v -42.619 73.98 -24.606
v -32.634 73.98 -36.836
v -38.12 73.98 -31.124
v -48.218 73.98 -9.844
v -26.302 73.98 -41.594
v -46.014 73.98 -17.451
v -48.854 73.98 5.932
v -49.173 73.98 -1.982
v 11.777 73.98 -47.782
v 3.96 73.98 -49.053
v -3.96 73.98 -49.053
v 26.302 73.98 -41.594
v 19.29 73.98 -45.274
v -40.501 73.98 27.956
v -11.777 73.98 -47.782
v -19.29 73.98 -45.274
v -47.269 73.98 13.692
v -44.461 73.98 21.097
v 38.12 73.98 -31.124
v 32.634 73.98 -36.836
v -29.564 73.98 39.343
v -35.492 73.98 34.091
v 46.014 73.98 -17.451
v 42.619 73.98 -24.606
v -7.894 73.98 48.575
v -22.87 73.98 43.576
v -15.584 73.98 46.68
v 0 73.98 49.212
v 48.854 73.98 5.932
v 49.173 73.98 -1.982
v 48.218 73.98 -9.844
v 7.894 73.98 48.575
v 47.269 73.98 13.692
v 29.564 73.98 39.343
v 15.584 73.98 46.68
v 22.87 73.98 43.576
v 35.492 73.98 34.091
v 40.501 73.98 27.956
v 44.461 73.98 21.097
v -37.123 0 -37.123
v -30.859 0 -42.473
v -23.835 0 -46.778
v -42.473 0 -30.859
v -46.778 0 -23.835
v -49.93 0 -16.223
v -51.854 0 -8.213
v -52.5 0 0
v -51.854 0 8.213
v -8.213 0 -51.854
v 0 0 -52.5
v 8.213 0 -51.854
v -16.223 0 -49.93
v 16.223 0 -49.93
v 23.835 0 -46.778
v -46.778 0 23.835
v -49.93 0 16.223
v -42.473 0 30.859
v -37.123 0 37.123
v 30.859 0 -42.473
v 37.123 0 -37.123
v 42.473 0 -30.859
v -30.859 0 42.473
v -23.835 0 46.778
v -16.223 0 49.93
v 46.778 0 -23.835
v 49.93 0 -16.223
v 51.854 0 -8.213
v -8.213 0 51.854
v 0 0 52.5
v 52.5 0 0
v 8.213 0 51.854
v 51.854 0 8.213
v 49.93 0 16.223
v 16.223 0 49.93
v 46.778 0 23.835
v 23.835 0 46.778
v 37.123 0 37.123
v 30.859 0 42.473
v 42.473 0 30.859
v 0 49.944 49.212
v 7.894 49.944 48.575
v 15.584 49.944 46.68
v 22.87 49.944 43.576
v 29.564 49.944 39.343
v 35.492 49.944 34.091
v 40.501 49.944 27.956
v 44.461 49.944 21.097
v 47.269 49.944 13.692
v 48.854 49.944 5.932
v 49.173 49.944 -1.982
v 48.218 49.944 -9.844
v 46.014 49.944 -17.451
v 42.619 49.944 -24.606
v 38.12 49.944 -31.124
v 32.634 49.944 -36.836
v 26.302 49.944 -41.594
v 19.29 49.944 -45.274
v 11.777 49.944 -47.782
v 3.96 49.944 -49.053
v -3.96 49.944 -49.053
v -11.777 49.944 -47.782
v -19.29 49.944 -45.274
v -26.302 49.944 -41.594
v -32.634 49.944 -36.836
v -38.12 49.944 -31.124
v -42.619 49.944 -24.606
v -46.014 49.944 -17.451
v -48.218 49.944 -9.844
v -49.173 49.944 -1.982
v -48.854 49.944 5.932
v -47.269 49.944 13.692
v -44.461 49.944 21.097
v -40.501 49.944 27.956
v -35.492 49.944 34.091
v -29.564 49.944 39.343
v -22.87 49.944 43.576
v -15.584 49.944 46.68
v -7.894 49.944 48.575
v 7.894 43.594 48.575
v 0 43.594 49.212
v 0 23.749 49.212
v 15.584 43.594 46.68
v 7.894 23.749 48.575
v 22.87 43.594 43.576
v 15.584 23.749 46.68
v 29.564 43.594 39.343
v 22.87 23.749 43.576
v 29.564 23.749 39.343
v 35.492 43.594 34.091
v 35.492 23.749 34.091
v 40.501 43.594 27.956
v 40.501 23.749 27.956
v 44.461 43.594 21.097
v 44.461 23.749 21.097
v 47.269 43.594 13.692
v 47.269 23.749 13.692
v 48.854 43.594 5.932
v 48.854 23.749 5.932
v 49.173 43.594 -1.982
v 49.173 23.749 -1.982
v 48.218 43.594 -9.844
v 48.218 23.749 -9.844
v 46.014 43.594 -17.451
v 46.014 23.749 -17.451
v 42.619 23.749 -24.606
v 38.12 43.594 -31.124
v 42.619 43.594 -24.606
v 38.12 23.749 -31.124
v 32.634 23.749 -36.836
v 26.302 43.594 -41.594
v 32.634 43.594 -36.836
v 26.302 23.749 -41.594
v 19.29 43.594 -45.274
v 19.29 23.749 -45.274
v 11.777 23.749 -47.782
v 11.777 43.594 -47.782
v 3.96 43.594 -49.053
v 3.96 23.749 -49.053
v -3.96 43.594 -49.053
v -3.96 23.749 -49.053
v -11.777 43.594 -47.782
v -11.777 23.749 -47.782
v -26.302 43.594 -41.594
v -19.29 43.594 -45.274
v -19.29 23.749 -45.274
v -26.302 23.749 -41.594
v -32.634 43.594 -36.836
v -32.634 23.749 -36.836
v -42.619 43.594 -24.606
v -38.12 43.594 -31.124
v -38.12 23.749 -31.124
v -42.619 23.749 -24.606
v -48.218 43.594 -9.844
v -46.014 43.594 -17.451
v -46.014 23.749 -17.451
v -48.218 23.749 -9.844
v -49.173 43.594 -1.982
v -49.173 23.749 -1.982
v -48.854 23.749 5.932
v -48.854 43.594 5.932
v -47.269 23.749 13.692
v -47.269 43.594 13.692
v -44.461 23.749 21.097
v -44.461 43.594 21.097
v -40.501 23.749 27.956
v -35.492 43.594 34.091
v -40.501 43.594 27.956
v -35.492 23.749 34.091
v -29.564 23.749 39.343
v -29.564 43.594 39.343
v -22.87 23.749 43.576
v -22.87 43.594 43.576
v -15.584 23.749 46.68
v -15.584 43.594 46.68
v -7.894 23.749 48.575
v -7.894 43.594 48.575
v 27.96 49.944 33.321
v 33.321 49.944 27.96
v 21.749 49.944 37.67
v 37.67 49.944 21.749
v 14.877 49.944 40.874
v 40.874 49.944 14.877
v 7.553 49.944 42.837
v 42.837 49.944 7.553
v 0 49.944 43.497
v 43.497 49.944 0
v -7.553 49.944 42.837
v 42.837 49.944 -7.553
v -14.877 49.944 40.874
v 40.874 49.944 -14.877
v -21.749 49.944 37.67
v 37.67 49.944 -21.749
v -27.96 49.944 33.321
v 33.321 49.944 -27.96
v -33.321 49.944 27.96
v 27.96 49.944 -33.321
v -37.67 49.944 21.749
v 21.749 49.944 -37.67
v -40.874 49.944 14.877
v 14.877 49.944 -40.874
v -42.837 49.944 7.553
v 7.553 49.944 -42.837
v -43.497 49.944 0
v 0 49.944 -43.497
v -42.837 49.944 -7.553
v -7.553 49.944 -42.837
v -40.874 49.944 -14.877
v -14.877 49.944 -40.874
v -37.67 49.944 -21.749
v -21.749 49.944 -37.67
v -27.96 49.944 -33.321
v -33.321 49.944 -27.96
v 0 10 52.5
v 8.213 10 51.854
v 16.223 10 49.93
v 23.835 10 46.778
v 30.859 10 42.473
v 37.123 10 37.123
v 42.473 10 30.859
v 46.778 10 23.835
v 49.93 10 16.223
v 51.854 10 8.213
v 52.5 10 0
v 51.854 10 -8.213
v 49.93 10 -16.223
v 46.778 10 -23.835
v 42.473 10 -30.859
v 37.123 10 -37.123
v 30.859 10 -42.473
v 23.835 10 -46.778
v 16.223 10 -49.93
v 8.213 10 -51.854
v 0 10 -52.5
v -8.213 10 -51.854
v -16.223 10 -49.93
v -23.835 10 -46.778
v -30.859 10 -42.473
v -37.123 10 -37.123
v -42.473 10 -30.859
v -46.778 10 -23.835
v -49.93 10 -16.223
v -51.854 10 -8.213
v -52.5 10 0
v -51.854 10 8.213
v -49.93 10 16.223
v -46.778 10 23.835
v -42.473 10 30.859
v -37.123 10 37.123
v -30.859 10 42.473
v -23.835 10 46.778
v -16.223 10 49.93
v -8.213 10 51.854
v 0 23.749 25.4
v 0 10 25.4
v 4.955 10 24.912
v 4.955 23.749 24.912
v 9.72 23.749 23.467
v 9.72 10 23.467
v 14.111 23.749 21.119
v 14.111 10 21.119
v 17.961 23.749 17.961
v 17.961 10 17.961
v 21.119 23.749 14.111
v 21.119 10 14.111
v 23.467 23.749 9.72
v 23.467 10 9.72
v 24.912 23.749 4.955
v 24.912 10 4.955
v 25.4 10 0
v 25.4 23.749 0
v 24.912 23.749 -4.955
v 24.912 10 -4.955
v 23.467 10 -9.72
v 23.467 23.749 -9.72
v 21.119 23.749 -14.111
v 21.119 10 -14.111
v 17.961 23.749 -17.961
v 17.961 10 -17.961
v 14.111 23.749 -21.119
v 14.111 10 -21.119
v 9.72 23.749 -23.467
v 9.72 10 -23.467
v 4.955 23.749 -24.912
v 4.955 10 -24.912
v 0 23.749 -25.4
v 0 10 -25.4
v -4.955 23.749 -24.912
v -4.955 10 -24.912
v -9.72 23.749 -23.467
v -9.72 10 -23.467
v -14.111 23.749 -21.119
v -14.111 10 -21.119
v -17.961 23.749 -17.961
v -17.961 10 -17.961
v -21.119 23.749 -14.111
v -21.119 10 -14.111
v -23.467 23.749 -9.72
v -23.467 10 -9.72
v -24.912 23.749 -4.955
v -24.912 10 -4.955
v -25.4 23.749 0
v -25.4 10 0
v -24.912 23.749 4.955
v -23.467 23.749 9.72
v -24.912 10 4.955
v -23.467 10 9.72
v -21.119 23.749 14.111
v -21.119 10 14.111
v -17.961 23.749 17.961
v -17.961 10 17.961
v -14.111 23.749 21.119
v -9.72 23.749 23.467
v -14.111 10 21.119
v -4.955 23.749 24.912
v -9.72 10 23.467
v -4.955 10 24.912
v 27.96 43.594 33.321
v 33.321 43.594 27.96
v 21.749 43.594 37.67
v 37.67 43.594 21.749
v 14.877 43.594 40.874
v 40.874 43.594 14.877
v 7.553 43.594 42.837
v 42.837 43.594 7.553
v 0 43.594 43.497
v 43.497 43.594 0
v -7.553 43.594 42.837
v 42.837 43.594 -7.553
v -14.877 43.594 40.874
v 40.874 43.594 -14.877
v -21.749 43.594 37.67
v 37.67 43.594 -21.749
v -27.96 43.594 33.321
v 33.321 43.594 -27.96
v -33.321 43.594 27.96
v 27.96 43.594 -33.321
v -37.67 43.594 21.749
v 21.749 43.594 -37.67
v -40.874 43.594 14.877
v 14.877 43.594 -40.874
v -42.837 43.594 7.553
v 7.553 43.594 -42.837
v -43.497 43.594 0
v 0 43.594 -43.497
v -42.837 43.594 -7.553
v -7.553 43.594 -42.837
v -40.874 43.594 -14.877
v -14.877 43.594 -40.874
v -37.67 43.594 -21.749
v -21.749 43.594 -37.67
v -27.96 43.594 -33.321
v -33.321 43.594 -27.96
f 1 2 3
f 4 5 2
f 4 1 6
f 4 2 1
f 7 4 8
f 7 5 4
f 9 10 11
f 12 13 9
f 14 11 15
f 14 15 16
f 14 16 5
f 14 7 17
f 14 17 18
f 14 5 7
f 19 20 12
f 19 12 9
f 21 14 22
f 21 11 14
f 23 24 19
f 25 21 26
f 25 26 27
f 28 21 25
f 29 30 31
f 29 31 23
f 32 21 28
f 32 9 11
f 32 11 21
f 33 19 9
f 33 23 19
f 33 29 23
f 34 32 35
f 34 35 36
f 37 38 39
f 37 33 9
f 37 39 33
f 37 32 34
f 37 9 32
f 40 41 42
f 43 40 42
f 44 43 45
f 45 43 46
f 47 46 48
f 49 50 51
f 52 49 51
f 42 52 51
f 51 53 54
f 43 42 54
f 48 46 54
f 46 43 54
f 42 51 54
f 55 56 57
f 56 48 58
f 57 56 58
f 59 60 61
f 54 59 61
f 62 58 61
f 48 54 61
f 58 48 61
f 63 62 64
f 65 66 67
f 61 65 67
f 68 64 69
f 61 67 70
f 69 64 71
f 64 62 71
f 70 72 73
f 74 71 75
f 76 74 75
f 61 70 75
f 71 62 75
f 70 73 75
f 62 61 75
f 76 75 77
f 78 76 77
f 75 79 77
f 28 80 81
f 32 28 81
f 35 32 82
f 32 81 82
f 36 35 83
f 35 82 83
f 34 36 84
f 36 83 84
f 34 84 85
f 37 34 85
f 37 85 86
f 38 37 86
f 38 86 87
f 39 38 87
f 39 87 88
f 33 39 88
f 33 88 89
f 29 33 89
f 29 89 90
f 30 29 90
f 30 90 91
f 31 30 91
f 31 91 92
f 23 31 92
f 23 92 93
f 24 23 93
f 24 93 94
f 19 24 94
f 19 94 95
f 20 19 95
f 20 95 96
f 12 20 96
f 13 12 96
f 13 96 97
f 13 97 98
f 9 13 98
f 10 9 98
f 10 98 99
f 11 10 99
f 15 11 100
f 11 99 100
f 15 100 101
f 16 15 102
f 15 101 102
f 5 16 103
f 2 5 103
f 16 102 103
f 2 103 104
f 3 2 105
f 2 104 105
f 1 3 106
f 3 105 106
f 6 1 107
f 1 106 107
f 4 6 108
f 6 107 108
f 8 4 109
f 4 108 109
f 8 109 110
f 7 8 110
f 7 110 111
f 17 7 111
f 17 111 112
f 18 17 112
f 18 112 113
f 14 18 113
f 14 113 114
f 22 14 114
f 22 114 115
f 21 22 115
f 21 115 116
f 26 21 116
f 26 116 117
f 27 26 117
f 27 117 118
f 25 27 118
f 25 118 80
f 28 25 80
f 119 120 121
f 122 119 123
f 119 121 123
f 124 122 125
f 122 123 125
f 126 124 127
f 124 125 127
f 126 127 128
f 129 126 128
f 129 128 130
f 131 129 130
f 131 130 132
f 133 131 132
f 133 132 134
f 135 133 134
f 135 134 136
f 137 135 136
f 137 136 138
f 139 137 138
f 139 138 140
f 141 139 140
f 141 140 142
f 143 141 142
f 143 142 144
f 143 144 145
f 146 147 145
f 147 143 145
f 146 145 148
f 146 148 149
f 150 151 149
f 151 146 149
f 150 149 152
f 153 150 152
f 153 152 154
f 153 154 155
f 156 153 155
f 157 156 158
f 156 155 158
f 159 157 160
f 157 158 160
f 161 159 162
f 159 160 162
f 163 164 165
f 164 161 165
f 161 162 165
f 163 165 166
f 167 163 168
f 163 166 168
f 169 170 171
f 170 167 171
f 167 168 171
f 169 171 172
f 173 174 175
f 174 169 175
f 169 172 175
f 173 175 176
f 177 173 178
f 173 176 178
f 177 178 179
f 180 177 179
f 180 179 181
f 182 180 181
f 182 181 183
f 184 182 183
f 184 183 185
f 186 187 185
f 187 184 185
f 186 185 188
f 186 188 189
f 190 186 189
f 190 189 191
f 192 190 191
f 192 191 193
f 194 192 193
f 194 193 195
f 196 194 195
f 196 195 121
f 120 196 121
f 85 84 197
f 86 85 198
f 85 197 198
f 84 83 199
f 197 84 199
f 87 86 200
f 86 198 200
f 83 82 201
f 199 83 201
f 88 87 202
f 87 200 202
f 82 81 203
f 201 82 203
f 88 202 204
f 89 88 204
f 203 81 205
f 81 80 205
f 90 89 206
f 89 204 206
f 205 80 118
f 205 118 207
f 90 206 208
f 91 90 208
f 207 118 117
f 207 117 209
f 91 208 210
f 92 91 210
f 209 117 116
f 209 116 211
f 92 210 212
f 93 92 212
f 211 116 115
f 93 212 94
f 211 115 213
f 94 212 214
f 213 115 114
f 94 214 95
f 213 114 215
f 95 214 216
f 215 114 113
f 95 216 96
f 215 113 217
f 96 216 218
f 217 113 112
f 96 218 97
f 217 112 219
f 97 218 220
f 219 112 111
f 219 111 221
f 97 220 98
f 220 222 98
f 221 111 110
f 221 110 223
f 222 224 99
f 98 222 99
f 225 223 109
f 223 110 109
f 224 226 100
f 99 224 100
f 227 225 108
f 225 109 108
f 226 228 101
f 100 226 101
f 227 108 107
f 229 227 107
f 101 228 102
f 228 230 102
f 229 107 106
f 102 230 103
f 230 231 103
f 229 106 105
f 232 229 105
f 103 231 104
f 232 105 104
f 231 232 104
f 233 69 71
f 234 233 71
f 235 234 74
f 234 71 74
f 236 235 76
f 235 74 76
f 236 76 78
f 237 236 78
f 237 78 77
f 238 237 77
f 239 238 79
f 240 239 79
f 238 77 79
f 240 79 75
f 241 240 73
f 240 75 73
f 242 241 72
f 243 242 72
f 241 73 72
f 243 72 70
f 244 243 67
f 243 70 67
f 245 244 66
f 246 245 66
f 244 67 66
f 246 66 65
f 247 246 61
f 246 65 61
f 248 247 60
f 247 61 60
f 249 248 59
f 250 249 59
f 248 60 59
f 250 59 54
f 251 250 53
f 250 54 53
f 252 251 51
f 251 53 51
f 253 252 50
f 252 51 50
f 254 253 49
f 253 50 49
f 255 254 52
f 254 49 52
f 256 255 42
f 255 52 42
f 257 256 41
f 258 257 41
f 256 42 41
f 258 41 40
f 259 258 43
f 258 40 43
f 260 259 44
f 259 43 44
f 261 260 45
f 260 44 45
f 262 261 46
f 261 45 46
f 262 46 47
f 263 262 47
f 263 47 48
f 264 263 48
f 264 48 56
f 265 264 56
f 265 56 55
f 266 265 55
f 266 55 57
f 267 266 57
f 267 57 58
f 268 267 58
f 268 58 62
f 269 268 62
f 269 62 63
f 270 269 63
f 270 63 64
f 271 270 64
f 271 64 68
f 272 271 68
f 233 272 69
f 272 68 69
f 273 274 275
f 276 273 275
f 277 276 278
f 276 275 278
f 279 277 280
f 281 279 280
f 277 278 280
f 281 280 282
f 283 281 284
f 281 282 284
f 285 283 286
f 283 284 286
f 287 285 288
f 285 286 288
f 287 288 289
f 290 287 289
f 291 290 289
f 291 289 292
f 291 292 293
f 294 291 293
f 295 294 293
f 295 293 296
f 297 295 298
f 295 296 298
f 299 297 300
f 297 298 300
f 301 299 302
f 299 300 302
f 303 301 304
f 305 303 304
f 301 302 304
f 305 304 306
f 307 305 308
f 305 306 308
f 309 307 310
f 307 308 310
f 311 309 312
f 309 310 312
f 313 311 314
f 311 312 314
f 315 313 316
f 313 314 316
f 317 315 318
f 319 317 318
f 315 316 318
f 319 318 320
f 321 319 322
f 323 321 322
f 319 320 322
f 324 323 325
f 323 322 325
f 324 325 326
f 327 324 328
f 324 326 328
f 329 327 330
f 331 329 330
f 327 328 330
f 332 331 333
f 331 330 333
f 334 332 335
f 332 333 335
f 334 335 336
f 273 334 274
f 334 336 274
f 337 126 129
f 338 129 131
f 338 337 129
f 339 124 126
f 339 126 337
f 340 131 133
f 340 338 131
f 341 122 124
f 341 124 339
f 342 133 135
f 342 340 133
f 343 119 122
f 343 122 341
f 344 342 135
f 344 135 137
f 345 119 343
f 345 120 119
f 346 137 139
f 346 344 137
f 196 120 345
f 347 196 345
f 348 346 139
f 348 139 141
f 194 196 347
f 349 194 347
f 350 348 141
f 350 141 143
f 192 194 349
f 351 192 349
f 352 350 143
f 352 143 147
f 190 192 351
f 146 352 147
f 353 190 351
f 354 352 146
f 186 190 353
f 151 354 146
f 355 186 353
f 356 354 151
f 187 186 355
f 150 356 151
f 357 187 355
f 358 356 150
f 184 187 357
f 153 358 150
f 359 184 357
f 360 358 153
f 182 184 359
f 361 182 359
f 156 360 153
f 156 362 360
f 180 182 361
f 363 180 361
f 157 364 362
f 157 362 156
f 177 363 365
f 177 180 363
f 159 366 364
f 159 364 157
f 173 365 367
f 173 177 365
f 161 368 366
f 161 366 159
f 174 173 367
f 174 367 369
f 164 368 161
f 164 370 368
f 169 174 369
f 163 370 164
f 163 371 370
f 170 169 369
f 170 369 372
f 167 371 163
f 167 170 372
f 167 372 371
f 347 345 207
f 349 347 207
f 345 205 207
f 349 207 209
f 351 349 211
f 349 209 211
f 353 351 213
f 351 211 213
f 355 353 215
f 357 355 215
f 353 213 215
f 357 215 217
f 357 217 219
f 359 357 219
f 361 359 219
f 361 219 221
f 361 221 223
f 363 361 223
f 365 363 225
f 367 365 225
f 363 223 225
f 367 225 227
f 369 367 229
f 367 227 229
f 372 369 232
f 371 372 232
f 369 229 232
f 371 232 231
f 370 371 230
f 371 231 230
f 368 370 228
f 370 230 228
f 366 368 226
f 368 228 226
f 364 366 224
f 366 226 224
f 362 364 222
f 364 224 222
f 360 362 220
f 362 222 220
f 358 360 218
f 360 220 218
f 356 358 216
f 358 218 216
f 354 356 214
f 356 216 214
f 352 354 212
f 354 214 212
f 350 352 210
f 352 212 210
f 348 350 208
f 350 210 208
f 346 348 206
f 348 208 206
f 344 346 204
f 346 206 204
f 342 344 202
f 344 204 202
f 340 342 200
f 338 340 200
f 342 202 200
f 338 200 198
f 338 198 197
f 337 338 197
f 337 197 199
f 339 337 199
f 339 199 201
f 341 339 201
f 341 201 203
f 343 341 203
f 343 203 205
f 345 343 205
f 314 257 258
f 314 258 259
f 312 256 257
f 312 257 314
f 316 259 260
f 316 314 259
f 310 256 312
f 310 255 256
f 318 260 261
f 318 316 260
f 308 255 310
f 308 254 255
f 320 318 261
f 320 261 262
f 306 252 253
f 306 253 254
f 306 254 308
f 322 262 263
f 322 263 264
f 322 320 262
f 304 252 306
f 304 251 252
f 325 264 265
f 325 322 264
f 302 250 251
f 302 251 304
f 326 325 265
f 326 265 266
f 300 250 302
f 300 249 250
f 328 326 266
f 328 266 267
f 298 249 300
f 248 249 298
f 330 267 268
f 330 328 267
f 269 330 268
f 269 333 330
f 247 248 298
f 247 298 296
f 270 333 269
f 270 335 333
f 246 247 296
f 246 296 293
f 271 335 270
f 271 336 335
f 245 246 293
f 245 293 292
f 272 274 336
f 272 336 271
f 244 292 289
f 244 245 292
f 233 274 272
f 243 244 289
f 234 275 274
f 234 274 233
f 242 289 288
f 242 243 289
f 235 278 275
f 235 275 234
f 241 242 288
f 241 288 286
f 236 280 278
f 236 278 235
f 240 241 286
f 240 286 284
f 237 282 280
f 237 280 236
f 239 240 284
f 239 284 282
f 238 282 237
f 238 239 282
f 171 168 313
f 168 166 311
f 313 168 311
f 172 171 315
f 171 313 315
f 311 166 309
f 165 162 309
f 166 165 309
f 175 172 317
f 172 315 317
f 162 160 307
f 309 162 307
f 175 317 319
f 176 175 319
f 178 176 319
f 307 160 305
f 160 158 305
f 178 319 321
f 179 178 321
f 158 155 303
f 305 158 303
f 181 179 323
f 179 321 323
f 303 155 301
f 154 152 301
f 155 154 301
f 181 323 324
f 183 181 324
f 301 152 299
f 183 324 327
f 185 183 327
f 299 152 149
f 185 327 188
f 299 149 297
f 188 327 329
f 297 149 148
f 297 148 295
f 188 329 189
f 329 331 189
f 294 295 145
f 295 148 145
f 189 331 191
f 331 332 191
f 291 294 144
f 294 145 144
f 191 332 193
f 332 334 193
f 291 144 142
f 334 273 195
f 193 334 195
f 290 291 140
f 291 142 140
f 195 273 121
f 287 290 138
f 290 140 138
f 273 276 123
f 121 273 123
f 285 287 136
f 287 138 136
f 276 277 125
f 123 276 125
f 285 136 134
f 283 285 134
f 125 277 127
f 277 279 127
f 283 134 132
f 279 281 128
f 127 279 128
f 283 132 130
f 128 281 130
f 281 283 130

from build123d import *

# Parameters (mm, degrees)
MOUNTING_PLATE_SKETCH_R = 52.500000029
MOUNT_PLATE_DEPTH       = 10
SKETCH7_R               = 25.4
BOSS_EXTRUDE5_DEPTH     = 13.74902
SKETCH12_R              = 49.2125
BOSS_EXTRUDE6_DEPTH     = 50.23104
SKETCH15_W              = 5.715
SKETCH15_H              = 6.35


with BuildPart() as part:
    # Mounting Plate SKETCH → Mount Plate (new body)
    with BuildSketch(Plane(origin=(0, 0, 0), x_dir=(1, 0, 0), z_dir=(0, 1, 0))):
        with Locations(Location((0, 0, 0), (0, 0, 270))):
            Circle(MOUNTING_PLATE_SKETCH_R)
    extrude(amount=MOUNT_PLATE_DEPTH)

    # Sketch7 → Boss-Extrude5 (add)
    with BuildSketch(Plane(origin=(0, 10, 0), x_dir=(1, 0, 0), z_dir=(0, 1, 0))):
        with Locations(Location((0, 0, 0), (0, 0, 270))):
            Circle(SKETCH7_R)
    extrude(amount=BOSS_EXTRUDE5_DEPTH)

    # Sketch12 → Boss-Extrude6 (add)
    with BuildSketch(Plane(origin=(0, 23.74902, 0), x_dir=(1, 0, 0), z_dir=(0, 1, 0))):
        with Locations(Location((0, 0, 0), (0, 0, 270))):
            Circle(SKETCH12_R)
    extrude(amount=BOSS_EXTRUDE6_DEPTH)

    # Sketch15 → Cut-Revolve3 (revolve, cut)
    with BuildSketch(Plane(origin=(0, 0, 0), x_dir=(0, 0, -1), z_dir=(1, 0, 0)), mode=Mode.PRIVATE) as cut_revolve3_sk:
        with Locations((46.355, 46.76904)):
            Rectangle(SKETCH15_W, SKETCH15_H)
    revolve(cut_revolve3_sk.sketch.rotate(Axis((0, 0, 0), (0, -1, 0)), 180), axis=Axis((0, 0, 0), (0, -1, 0)), mode=Mode.SUBTRACT)


solid = part.part
